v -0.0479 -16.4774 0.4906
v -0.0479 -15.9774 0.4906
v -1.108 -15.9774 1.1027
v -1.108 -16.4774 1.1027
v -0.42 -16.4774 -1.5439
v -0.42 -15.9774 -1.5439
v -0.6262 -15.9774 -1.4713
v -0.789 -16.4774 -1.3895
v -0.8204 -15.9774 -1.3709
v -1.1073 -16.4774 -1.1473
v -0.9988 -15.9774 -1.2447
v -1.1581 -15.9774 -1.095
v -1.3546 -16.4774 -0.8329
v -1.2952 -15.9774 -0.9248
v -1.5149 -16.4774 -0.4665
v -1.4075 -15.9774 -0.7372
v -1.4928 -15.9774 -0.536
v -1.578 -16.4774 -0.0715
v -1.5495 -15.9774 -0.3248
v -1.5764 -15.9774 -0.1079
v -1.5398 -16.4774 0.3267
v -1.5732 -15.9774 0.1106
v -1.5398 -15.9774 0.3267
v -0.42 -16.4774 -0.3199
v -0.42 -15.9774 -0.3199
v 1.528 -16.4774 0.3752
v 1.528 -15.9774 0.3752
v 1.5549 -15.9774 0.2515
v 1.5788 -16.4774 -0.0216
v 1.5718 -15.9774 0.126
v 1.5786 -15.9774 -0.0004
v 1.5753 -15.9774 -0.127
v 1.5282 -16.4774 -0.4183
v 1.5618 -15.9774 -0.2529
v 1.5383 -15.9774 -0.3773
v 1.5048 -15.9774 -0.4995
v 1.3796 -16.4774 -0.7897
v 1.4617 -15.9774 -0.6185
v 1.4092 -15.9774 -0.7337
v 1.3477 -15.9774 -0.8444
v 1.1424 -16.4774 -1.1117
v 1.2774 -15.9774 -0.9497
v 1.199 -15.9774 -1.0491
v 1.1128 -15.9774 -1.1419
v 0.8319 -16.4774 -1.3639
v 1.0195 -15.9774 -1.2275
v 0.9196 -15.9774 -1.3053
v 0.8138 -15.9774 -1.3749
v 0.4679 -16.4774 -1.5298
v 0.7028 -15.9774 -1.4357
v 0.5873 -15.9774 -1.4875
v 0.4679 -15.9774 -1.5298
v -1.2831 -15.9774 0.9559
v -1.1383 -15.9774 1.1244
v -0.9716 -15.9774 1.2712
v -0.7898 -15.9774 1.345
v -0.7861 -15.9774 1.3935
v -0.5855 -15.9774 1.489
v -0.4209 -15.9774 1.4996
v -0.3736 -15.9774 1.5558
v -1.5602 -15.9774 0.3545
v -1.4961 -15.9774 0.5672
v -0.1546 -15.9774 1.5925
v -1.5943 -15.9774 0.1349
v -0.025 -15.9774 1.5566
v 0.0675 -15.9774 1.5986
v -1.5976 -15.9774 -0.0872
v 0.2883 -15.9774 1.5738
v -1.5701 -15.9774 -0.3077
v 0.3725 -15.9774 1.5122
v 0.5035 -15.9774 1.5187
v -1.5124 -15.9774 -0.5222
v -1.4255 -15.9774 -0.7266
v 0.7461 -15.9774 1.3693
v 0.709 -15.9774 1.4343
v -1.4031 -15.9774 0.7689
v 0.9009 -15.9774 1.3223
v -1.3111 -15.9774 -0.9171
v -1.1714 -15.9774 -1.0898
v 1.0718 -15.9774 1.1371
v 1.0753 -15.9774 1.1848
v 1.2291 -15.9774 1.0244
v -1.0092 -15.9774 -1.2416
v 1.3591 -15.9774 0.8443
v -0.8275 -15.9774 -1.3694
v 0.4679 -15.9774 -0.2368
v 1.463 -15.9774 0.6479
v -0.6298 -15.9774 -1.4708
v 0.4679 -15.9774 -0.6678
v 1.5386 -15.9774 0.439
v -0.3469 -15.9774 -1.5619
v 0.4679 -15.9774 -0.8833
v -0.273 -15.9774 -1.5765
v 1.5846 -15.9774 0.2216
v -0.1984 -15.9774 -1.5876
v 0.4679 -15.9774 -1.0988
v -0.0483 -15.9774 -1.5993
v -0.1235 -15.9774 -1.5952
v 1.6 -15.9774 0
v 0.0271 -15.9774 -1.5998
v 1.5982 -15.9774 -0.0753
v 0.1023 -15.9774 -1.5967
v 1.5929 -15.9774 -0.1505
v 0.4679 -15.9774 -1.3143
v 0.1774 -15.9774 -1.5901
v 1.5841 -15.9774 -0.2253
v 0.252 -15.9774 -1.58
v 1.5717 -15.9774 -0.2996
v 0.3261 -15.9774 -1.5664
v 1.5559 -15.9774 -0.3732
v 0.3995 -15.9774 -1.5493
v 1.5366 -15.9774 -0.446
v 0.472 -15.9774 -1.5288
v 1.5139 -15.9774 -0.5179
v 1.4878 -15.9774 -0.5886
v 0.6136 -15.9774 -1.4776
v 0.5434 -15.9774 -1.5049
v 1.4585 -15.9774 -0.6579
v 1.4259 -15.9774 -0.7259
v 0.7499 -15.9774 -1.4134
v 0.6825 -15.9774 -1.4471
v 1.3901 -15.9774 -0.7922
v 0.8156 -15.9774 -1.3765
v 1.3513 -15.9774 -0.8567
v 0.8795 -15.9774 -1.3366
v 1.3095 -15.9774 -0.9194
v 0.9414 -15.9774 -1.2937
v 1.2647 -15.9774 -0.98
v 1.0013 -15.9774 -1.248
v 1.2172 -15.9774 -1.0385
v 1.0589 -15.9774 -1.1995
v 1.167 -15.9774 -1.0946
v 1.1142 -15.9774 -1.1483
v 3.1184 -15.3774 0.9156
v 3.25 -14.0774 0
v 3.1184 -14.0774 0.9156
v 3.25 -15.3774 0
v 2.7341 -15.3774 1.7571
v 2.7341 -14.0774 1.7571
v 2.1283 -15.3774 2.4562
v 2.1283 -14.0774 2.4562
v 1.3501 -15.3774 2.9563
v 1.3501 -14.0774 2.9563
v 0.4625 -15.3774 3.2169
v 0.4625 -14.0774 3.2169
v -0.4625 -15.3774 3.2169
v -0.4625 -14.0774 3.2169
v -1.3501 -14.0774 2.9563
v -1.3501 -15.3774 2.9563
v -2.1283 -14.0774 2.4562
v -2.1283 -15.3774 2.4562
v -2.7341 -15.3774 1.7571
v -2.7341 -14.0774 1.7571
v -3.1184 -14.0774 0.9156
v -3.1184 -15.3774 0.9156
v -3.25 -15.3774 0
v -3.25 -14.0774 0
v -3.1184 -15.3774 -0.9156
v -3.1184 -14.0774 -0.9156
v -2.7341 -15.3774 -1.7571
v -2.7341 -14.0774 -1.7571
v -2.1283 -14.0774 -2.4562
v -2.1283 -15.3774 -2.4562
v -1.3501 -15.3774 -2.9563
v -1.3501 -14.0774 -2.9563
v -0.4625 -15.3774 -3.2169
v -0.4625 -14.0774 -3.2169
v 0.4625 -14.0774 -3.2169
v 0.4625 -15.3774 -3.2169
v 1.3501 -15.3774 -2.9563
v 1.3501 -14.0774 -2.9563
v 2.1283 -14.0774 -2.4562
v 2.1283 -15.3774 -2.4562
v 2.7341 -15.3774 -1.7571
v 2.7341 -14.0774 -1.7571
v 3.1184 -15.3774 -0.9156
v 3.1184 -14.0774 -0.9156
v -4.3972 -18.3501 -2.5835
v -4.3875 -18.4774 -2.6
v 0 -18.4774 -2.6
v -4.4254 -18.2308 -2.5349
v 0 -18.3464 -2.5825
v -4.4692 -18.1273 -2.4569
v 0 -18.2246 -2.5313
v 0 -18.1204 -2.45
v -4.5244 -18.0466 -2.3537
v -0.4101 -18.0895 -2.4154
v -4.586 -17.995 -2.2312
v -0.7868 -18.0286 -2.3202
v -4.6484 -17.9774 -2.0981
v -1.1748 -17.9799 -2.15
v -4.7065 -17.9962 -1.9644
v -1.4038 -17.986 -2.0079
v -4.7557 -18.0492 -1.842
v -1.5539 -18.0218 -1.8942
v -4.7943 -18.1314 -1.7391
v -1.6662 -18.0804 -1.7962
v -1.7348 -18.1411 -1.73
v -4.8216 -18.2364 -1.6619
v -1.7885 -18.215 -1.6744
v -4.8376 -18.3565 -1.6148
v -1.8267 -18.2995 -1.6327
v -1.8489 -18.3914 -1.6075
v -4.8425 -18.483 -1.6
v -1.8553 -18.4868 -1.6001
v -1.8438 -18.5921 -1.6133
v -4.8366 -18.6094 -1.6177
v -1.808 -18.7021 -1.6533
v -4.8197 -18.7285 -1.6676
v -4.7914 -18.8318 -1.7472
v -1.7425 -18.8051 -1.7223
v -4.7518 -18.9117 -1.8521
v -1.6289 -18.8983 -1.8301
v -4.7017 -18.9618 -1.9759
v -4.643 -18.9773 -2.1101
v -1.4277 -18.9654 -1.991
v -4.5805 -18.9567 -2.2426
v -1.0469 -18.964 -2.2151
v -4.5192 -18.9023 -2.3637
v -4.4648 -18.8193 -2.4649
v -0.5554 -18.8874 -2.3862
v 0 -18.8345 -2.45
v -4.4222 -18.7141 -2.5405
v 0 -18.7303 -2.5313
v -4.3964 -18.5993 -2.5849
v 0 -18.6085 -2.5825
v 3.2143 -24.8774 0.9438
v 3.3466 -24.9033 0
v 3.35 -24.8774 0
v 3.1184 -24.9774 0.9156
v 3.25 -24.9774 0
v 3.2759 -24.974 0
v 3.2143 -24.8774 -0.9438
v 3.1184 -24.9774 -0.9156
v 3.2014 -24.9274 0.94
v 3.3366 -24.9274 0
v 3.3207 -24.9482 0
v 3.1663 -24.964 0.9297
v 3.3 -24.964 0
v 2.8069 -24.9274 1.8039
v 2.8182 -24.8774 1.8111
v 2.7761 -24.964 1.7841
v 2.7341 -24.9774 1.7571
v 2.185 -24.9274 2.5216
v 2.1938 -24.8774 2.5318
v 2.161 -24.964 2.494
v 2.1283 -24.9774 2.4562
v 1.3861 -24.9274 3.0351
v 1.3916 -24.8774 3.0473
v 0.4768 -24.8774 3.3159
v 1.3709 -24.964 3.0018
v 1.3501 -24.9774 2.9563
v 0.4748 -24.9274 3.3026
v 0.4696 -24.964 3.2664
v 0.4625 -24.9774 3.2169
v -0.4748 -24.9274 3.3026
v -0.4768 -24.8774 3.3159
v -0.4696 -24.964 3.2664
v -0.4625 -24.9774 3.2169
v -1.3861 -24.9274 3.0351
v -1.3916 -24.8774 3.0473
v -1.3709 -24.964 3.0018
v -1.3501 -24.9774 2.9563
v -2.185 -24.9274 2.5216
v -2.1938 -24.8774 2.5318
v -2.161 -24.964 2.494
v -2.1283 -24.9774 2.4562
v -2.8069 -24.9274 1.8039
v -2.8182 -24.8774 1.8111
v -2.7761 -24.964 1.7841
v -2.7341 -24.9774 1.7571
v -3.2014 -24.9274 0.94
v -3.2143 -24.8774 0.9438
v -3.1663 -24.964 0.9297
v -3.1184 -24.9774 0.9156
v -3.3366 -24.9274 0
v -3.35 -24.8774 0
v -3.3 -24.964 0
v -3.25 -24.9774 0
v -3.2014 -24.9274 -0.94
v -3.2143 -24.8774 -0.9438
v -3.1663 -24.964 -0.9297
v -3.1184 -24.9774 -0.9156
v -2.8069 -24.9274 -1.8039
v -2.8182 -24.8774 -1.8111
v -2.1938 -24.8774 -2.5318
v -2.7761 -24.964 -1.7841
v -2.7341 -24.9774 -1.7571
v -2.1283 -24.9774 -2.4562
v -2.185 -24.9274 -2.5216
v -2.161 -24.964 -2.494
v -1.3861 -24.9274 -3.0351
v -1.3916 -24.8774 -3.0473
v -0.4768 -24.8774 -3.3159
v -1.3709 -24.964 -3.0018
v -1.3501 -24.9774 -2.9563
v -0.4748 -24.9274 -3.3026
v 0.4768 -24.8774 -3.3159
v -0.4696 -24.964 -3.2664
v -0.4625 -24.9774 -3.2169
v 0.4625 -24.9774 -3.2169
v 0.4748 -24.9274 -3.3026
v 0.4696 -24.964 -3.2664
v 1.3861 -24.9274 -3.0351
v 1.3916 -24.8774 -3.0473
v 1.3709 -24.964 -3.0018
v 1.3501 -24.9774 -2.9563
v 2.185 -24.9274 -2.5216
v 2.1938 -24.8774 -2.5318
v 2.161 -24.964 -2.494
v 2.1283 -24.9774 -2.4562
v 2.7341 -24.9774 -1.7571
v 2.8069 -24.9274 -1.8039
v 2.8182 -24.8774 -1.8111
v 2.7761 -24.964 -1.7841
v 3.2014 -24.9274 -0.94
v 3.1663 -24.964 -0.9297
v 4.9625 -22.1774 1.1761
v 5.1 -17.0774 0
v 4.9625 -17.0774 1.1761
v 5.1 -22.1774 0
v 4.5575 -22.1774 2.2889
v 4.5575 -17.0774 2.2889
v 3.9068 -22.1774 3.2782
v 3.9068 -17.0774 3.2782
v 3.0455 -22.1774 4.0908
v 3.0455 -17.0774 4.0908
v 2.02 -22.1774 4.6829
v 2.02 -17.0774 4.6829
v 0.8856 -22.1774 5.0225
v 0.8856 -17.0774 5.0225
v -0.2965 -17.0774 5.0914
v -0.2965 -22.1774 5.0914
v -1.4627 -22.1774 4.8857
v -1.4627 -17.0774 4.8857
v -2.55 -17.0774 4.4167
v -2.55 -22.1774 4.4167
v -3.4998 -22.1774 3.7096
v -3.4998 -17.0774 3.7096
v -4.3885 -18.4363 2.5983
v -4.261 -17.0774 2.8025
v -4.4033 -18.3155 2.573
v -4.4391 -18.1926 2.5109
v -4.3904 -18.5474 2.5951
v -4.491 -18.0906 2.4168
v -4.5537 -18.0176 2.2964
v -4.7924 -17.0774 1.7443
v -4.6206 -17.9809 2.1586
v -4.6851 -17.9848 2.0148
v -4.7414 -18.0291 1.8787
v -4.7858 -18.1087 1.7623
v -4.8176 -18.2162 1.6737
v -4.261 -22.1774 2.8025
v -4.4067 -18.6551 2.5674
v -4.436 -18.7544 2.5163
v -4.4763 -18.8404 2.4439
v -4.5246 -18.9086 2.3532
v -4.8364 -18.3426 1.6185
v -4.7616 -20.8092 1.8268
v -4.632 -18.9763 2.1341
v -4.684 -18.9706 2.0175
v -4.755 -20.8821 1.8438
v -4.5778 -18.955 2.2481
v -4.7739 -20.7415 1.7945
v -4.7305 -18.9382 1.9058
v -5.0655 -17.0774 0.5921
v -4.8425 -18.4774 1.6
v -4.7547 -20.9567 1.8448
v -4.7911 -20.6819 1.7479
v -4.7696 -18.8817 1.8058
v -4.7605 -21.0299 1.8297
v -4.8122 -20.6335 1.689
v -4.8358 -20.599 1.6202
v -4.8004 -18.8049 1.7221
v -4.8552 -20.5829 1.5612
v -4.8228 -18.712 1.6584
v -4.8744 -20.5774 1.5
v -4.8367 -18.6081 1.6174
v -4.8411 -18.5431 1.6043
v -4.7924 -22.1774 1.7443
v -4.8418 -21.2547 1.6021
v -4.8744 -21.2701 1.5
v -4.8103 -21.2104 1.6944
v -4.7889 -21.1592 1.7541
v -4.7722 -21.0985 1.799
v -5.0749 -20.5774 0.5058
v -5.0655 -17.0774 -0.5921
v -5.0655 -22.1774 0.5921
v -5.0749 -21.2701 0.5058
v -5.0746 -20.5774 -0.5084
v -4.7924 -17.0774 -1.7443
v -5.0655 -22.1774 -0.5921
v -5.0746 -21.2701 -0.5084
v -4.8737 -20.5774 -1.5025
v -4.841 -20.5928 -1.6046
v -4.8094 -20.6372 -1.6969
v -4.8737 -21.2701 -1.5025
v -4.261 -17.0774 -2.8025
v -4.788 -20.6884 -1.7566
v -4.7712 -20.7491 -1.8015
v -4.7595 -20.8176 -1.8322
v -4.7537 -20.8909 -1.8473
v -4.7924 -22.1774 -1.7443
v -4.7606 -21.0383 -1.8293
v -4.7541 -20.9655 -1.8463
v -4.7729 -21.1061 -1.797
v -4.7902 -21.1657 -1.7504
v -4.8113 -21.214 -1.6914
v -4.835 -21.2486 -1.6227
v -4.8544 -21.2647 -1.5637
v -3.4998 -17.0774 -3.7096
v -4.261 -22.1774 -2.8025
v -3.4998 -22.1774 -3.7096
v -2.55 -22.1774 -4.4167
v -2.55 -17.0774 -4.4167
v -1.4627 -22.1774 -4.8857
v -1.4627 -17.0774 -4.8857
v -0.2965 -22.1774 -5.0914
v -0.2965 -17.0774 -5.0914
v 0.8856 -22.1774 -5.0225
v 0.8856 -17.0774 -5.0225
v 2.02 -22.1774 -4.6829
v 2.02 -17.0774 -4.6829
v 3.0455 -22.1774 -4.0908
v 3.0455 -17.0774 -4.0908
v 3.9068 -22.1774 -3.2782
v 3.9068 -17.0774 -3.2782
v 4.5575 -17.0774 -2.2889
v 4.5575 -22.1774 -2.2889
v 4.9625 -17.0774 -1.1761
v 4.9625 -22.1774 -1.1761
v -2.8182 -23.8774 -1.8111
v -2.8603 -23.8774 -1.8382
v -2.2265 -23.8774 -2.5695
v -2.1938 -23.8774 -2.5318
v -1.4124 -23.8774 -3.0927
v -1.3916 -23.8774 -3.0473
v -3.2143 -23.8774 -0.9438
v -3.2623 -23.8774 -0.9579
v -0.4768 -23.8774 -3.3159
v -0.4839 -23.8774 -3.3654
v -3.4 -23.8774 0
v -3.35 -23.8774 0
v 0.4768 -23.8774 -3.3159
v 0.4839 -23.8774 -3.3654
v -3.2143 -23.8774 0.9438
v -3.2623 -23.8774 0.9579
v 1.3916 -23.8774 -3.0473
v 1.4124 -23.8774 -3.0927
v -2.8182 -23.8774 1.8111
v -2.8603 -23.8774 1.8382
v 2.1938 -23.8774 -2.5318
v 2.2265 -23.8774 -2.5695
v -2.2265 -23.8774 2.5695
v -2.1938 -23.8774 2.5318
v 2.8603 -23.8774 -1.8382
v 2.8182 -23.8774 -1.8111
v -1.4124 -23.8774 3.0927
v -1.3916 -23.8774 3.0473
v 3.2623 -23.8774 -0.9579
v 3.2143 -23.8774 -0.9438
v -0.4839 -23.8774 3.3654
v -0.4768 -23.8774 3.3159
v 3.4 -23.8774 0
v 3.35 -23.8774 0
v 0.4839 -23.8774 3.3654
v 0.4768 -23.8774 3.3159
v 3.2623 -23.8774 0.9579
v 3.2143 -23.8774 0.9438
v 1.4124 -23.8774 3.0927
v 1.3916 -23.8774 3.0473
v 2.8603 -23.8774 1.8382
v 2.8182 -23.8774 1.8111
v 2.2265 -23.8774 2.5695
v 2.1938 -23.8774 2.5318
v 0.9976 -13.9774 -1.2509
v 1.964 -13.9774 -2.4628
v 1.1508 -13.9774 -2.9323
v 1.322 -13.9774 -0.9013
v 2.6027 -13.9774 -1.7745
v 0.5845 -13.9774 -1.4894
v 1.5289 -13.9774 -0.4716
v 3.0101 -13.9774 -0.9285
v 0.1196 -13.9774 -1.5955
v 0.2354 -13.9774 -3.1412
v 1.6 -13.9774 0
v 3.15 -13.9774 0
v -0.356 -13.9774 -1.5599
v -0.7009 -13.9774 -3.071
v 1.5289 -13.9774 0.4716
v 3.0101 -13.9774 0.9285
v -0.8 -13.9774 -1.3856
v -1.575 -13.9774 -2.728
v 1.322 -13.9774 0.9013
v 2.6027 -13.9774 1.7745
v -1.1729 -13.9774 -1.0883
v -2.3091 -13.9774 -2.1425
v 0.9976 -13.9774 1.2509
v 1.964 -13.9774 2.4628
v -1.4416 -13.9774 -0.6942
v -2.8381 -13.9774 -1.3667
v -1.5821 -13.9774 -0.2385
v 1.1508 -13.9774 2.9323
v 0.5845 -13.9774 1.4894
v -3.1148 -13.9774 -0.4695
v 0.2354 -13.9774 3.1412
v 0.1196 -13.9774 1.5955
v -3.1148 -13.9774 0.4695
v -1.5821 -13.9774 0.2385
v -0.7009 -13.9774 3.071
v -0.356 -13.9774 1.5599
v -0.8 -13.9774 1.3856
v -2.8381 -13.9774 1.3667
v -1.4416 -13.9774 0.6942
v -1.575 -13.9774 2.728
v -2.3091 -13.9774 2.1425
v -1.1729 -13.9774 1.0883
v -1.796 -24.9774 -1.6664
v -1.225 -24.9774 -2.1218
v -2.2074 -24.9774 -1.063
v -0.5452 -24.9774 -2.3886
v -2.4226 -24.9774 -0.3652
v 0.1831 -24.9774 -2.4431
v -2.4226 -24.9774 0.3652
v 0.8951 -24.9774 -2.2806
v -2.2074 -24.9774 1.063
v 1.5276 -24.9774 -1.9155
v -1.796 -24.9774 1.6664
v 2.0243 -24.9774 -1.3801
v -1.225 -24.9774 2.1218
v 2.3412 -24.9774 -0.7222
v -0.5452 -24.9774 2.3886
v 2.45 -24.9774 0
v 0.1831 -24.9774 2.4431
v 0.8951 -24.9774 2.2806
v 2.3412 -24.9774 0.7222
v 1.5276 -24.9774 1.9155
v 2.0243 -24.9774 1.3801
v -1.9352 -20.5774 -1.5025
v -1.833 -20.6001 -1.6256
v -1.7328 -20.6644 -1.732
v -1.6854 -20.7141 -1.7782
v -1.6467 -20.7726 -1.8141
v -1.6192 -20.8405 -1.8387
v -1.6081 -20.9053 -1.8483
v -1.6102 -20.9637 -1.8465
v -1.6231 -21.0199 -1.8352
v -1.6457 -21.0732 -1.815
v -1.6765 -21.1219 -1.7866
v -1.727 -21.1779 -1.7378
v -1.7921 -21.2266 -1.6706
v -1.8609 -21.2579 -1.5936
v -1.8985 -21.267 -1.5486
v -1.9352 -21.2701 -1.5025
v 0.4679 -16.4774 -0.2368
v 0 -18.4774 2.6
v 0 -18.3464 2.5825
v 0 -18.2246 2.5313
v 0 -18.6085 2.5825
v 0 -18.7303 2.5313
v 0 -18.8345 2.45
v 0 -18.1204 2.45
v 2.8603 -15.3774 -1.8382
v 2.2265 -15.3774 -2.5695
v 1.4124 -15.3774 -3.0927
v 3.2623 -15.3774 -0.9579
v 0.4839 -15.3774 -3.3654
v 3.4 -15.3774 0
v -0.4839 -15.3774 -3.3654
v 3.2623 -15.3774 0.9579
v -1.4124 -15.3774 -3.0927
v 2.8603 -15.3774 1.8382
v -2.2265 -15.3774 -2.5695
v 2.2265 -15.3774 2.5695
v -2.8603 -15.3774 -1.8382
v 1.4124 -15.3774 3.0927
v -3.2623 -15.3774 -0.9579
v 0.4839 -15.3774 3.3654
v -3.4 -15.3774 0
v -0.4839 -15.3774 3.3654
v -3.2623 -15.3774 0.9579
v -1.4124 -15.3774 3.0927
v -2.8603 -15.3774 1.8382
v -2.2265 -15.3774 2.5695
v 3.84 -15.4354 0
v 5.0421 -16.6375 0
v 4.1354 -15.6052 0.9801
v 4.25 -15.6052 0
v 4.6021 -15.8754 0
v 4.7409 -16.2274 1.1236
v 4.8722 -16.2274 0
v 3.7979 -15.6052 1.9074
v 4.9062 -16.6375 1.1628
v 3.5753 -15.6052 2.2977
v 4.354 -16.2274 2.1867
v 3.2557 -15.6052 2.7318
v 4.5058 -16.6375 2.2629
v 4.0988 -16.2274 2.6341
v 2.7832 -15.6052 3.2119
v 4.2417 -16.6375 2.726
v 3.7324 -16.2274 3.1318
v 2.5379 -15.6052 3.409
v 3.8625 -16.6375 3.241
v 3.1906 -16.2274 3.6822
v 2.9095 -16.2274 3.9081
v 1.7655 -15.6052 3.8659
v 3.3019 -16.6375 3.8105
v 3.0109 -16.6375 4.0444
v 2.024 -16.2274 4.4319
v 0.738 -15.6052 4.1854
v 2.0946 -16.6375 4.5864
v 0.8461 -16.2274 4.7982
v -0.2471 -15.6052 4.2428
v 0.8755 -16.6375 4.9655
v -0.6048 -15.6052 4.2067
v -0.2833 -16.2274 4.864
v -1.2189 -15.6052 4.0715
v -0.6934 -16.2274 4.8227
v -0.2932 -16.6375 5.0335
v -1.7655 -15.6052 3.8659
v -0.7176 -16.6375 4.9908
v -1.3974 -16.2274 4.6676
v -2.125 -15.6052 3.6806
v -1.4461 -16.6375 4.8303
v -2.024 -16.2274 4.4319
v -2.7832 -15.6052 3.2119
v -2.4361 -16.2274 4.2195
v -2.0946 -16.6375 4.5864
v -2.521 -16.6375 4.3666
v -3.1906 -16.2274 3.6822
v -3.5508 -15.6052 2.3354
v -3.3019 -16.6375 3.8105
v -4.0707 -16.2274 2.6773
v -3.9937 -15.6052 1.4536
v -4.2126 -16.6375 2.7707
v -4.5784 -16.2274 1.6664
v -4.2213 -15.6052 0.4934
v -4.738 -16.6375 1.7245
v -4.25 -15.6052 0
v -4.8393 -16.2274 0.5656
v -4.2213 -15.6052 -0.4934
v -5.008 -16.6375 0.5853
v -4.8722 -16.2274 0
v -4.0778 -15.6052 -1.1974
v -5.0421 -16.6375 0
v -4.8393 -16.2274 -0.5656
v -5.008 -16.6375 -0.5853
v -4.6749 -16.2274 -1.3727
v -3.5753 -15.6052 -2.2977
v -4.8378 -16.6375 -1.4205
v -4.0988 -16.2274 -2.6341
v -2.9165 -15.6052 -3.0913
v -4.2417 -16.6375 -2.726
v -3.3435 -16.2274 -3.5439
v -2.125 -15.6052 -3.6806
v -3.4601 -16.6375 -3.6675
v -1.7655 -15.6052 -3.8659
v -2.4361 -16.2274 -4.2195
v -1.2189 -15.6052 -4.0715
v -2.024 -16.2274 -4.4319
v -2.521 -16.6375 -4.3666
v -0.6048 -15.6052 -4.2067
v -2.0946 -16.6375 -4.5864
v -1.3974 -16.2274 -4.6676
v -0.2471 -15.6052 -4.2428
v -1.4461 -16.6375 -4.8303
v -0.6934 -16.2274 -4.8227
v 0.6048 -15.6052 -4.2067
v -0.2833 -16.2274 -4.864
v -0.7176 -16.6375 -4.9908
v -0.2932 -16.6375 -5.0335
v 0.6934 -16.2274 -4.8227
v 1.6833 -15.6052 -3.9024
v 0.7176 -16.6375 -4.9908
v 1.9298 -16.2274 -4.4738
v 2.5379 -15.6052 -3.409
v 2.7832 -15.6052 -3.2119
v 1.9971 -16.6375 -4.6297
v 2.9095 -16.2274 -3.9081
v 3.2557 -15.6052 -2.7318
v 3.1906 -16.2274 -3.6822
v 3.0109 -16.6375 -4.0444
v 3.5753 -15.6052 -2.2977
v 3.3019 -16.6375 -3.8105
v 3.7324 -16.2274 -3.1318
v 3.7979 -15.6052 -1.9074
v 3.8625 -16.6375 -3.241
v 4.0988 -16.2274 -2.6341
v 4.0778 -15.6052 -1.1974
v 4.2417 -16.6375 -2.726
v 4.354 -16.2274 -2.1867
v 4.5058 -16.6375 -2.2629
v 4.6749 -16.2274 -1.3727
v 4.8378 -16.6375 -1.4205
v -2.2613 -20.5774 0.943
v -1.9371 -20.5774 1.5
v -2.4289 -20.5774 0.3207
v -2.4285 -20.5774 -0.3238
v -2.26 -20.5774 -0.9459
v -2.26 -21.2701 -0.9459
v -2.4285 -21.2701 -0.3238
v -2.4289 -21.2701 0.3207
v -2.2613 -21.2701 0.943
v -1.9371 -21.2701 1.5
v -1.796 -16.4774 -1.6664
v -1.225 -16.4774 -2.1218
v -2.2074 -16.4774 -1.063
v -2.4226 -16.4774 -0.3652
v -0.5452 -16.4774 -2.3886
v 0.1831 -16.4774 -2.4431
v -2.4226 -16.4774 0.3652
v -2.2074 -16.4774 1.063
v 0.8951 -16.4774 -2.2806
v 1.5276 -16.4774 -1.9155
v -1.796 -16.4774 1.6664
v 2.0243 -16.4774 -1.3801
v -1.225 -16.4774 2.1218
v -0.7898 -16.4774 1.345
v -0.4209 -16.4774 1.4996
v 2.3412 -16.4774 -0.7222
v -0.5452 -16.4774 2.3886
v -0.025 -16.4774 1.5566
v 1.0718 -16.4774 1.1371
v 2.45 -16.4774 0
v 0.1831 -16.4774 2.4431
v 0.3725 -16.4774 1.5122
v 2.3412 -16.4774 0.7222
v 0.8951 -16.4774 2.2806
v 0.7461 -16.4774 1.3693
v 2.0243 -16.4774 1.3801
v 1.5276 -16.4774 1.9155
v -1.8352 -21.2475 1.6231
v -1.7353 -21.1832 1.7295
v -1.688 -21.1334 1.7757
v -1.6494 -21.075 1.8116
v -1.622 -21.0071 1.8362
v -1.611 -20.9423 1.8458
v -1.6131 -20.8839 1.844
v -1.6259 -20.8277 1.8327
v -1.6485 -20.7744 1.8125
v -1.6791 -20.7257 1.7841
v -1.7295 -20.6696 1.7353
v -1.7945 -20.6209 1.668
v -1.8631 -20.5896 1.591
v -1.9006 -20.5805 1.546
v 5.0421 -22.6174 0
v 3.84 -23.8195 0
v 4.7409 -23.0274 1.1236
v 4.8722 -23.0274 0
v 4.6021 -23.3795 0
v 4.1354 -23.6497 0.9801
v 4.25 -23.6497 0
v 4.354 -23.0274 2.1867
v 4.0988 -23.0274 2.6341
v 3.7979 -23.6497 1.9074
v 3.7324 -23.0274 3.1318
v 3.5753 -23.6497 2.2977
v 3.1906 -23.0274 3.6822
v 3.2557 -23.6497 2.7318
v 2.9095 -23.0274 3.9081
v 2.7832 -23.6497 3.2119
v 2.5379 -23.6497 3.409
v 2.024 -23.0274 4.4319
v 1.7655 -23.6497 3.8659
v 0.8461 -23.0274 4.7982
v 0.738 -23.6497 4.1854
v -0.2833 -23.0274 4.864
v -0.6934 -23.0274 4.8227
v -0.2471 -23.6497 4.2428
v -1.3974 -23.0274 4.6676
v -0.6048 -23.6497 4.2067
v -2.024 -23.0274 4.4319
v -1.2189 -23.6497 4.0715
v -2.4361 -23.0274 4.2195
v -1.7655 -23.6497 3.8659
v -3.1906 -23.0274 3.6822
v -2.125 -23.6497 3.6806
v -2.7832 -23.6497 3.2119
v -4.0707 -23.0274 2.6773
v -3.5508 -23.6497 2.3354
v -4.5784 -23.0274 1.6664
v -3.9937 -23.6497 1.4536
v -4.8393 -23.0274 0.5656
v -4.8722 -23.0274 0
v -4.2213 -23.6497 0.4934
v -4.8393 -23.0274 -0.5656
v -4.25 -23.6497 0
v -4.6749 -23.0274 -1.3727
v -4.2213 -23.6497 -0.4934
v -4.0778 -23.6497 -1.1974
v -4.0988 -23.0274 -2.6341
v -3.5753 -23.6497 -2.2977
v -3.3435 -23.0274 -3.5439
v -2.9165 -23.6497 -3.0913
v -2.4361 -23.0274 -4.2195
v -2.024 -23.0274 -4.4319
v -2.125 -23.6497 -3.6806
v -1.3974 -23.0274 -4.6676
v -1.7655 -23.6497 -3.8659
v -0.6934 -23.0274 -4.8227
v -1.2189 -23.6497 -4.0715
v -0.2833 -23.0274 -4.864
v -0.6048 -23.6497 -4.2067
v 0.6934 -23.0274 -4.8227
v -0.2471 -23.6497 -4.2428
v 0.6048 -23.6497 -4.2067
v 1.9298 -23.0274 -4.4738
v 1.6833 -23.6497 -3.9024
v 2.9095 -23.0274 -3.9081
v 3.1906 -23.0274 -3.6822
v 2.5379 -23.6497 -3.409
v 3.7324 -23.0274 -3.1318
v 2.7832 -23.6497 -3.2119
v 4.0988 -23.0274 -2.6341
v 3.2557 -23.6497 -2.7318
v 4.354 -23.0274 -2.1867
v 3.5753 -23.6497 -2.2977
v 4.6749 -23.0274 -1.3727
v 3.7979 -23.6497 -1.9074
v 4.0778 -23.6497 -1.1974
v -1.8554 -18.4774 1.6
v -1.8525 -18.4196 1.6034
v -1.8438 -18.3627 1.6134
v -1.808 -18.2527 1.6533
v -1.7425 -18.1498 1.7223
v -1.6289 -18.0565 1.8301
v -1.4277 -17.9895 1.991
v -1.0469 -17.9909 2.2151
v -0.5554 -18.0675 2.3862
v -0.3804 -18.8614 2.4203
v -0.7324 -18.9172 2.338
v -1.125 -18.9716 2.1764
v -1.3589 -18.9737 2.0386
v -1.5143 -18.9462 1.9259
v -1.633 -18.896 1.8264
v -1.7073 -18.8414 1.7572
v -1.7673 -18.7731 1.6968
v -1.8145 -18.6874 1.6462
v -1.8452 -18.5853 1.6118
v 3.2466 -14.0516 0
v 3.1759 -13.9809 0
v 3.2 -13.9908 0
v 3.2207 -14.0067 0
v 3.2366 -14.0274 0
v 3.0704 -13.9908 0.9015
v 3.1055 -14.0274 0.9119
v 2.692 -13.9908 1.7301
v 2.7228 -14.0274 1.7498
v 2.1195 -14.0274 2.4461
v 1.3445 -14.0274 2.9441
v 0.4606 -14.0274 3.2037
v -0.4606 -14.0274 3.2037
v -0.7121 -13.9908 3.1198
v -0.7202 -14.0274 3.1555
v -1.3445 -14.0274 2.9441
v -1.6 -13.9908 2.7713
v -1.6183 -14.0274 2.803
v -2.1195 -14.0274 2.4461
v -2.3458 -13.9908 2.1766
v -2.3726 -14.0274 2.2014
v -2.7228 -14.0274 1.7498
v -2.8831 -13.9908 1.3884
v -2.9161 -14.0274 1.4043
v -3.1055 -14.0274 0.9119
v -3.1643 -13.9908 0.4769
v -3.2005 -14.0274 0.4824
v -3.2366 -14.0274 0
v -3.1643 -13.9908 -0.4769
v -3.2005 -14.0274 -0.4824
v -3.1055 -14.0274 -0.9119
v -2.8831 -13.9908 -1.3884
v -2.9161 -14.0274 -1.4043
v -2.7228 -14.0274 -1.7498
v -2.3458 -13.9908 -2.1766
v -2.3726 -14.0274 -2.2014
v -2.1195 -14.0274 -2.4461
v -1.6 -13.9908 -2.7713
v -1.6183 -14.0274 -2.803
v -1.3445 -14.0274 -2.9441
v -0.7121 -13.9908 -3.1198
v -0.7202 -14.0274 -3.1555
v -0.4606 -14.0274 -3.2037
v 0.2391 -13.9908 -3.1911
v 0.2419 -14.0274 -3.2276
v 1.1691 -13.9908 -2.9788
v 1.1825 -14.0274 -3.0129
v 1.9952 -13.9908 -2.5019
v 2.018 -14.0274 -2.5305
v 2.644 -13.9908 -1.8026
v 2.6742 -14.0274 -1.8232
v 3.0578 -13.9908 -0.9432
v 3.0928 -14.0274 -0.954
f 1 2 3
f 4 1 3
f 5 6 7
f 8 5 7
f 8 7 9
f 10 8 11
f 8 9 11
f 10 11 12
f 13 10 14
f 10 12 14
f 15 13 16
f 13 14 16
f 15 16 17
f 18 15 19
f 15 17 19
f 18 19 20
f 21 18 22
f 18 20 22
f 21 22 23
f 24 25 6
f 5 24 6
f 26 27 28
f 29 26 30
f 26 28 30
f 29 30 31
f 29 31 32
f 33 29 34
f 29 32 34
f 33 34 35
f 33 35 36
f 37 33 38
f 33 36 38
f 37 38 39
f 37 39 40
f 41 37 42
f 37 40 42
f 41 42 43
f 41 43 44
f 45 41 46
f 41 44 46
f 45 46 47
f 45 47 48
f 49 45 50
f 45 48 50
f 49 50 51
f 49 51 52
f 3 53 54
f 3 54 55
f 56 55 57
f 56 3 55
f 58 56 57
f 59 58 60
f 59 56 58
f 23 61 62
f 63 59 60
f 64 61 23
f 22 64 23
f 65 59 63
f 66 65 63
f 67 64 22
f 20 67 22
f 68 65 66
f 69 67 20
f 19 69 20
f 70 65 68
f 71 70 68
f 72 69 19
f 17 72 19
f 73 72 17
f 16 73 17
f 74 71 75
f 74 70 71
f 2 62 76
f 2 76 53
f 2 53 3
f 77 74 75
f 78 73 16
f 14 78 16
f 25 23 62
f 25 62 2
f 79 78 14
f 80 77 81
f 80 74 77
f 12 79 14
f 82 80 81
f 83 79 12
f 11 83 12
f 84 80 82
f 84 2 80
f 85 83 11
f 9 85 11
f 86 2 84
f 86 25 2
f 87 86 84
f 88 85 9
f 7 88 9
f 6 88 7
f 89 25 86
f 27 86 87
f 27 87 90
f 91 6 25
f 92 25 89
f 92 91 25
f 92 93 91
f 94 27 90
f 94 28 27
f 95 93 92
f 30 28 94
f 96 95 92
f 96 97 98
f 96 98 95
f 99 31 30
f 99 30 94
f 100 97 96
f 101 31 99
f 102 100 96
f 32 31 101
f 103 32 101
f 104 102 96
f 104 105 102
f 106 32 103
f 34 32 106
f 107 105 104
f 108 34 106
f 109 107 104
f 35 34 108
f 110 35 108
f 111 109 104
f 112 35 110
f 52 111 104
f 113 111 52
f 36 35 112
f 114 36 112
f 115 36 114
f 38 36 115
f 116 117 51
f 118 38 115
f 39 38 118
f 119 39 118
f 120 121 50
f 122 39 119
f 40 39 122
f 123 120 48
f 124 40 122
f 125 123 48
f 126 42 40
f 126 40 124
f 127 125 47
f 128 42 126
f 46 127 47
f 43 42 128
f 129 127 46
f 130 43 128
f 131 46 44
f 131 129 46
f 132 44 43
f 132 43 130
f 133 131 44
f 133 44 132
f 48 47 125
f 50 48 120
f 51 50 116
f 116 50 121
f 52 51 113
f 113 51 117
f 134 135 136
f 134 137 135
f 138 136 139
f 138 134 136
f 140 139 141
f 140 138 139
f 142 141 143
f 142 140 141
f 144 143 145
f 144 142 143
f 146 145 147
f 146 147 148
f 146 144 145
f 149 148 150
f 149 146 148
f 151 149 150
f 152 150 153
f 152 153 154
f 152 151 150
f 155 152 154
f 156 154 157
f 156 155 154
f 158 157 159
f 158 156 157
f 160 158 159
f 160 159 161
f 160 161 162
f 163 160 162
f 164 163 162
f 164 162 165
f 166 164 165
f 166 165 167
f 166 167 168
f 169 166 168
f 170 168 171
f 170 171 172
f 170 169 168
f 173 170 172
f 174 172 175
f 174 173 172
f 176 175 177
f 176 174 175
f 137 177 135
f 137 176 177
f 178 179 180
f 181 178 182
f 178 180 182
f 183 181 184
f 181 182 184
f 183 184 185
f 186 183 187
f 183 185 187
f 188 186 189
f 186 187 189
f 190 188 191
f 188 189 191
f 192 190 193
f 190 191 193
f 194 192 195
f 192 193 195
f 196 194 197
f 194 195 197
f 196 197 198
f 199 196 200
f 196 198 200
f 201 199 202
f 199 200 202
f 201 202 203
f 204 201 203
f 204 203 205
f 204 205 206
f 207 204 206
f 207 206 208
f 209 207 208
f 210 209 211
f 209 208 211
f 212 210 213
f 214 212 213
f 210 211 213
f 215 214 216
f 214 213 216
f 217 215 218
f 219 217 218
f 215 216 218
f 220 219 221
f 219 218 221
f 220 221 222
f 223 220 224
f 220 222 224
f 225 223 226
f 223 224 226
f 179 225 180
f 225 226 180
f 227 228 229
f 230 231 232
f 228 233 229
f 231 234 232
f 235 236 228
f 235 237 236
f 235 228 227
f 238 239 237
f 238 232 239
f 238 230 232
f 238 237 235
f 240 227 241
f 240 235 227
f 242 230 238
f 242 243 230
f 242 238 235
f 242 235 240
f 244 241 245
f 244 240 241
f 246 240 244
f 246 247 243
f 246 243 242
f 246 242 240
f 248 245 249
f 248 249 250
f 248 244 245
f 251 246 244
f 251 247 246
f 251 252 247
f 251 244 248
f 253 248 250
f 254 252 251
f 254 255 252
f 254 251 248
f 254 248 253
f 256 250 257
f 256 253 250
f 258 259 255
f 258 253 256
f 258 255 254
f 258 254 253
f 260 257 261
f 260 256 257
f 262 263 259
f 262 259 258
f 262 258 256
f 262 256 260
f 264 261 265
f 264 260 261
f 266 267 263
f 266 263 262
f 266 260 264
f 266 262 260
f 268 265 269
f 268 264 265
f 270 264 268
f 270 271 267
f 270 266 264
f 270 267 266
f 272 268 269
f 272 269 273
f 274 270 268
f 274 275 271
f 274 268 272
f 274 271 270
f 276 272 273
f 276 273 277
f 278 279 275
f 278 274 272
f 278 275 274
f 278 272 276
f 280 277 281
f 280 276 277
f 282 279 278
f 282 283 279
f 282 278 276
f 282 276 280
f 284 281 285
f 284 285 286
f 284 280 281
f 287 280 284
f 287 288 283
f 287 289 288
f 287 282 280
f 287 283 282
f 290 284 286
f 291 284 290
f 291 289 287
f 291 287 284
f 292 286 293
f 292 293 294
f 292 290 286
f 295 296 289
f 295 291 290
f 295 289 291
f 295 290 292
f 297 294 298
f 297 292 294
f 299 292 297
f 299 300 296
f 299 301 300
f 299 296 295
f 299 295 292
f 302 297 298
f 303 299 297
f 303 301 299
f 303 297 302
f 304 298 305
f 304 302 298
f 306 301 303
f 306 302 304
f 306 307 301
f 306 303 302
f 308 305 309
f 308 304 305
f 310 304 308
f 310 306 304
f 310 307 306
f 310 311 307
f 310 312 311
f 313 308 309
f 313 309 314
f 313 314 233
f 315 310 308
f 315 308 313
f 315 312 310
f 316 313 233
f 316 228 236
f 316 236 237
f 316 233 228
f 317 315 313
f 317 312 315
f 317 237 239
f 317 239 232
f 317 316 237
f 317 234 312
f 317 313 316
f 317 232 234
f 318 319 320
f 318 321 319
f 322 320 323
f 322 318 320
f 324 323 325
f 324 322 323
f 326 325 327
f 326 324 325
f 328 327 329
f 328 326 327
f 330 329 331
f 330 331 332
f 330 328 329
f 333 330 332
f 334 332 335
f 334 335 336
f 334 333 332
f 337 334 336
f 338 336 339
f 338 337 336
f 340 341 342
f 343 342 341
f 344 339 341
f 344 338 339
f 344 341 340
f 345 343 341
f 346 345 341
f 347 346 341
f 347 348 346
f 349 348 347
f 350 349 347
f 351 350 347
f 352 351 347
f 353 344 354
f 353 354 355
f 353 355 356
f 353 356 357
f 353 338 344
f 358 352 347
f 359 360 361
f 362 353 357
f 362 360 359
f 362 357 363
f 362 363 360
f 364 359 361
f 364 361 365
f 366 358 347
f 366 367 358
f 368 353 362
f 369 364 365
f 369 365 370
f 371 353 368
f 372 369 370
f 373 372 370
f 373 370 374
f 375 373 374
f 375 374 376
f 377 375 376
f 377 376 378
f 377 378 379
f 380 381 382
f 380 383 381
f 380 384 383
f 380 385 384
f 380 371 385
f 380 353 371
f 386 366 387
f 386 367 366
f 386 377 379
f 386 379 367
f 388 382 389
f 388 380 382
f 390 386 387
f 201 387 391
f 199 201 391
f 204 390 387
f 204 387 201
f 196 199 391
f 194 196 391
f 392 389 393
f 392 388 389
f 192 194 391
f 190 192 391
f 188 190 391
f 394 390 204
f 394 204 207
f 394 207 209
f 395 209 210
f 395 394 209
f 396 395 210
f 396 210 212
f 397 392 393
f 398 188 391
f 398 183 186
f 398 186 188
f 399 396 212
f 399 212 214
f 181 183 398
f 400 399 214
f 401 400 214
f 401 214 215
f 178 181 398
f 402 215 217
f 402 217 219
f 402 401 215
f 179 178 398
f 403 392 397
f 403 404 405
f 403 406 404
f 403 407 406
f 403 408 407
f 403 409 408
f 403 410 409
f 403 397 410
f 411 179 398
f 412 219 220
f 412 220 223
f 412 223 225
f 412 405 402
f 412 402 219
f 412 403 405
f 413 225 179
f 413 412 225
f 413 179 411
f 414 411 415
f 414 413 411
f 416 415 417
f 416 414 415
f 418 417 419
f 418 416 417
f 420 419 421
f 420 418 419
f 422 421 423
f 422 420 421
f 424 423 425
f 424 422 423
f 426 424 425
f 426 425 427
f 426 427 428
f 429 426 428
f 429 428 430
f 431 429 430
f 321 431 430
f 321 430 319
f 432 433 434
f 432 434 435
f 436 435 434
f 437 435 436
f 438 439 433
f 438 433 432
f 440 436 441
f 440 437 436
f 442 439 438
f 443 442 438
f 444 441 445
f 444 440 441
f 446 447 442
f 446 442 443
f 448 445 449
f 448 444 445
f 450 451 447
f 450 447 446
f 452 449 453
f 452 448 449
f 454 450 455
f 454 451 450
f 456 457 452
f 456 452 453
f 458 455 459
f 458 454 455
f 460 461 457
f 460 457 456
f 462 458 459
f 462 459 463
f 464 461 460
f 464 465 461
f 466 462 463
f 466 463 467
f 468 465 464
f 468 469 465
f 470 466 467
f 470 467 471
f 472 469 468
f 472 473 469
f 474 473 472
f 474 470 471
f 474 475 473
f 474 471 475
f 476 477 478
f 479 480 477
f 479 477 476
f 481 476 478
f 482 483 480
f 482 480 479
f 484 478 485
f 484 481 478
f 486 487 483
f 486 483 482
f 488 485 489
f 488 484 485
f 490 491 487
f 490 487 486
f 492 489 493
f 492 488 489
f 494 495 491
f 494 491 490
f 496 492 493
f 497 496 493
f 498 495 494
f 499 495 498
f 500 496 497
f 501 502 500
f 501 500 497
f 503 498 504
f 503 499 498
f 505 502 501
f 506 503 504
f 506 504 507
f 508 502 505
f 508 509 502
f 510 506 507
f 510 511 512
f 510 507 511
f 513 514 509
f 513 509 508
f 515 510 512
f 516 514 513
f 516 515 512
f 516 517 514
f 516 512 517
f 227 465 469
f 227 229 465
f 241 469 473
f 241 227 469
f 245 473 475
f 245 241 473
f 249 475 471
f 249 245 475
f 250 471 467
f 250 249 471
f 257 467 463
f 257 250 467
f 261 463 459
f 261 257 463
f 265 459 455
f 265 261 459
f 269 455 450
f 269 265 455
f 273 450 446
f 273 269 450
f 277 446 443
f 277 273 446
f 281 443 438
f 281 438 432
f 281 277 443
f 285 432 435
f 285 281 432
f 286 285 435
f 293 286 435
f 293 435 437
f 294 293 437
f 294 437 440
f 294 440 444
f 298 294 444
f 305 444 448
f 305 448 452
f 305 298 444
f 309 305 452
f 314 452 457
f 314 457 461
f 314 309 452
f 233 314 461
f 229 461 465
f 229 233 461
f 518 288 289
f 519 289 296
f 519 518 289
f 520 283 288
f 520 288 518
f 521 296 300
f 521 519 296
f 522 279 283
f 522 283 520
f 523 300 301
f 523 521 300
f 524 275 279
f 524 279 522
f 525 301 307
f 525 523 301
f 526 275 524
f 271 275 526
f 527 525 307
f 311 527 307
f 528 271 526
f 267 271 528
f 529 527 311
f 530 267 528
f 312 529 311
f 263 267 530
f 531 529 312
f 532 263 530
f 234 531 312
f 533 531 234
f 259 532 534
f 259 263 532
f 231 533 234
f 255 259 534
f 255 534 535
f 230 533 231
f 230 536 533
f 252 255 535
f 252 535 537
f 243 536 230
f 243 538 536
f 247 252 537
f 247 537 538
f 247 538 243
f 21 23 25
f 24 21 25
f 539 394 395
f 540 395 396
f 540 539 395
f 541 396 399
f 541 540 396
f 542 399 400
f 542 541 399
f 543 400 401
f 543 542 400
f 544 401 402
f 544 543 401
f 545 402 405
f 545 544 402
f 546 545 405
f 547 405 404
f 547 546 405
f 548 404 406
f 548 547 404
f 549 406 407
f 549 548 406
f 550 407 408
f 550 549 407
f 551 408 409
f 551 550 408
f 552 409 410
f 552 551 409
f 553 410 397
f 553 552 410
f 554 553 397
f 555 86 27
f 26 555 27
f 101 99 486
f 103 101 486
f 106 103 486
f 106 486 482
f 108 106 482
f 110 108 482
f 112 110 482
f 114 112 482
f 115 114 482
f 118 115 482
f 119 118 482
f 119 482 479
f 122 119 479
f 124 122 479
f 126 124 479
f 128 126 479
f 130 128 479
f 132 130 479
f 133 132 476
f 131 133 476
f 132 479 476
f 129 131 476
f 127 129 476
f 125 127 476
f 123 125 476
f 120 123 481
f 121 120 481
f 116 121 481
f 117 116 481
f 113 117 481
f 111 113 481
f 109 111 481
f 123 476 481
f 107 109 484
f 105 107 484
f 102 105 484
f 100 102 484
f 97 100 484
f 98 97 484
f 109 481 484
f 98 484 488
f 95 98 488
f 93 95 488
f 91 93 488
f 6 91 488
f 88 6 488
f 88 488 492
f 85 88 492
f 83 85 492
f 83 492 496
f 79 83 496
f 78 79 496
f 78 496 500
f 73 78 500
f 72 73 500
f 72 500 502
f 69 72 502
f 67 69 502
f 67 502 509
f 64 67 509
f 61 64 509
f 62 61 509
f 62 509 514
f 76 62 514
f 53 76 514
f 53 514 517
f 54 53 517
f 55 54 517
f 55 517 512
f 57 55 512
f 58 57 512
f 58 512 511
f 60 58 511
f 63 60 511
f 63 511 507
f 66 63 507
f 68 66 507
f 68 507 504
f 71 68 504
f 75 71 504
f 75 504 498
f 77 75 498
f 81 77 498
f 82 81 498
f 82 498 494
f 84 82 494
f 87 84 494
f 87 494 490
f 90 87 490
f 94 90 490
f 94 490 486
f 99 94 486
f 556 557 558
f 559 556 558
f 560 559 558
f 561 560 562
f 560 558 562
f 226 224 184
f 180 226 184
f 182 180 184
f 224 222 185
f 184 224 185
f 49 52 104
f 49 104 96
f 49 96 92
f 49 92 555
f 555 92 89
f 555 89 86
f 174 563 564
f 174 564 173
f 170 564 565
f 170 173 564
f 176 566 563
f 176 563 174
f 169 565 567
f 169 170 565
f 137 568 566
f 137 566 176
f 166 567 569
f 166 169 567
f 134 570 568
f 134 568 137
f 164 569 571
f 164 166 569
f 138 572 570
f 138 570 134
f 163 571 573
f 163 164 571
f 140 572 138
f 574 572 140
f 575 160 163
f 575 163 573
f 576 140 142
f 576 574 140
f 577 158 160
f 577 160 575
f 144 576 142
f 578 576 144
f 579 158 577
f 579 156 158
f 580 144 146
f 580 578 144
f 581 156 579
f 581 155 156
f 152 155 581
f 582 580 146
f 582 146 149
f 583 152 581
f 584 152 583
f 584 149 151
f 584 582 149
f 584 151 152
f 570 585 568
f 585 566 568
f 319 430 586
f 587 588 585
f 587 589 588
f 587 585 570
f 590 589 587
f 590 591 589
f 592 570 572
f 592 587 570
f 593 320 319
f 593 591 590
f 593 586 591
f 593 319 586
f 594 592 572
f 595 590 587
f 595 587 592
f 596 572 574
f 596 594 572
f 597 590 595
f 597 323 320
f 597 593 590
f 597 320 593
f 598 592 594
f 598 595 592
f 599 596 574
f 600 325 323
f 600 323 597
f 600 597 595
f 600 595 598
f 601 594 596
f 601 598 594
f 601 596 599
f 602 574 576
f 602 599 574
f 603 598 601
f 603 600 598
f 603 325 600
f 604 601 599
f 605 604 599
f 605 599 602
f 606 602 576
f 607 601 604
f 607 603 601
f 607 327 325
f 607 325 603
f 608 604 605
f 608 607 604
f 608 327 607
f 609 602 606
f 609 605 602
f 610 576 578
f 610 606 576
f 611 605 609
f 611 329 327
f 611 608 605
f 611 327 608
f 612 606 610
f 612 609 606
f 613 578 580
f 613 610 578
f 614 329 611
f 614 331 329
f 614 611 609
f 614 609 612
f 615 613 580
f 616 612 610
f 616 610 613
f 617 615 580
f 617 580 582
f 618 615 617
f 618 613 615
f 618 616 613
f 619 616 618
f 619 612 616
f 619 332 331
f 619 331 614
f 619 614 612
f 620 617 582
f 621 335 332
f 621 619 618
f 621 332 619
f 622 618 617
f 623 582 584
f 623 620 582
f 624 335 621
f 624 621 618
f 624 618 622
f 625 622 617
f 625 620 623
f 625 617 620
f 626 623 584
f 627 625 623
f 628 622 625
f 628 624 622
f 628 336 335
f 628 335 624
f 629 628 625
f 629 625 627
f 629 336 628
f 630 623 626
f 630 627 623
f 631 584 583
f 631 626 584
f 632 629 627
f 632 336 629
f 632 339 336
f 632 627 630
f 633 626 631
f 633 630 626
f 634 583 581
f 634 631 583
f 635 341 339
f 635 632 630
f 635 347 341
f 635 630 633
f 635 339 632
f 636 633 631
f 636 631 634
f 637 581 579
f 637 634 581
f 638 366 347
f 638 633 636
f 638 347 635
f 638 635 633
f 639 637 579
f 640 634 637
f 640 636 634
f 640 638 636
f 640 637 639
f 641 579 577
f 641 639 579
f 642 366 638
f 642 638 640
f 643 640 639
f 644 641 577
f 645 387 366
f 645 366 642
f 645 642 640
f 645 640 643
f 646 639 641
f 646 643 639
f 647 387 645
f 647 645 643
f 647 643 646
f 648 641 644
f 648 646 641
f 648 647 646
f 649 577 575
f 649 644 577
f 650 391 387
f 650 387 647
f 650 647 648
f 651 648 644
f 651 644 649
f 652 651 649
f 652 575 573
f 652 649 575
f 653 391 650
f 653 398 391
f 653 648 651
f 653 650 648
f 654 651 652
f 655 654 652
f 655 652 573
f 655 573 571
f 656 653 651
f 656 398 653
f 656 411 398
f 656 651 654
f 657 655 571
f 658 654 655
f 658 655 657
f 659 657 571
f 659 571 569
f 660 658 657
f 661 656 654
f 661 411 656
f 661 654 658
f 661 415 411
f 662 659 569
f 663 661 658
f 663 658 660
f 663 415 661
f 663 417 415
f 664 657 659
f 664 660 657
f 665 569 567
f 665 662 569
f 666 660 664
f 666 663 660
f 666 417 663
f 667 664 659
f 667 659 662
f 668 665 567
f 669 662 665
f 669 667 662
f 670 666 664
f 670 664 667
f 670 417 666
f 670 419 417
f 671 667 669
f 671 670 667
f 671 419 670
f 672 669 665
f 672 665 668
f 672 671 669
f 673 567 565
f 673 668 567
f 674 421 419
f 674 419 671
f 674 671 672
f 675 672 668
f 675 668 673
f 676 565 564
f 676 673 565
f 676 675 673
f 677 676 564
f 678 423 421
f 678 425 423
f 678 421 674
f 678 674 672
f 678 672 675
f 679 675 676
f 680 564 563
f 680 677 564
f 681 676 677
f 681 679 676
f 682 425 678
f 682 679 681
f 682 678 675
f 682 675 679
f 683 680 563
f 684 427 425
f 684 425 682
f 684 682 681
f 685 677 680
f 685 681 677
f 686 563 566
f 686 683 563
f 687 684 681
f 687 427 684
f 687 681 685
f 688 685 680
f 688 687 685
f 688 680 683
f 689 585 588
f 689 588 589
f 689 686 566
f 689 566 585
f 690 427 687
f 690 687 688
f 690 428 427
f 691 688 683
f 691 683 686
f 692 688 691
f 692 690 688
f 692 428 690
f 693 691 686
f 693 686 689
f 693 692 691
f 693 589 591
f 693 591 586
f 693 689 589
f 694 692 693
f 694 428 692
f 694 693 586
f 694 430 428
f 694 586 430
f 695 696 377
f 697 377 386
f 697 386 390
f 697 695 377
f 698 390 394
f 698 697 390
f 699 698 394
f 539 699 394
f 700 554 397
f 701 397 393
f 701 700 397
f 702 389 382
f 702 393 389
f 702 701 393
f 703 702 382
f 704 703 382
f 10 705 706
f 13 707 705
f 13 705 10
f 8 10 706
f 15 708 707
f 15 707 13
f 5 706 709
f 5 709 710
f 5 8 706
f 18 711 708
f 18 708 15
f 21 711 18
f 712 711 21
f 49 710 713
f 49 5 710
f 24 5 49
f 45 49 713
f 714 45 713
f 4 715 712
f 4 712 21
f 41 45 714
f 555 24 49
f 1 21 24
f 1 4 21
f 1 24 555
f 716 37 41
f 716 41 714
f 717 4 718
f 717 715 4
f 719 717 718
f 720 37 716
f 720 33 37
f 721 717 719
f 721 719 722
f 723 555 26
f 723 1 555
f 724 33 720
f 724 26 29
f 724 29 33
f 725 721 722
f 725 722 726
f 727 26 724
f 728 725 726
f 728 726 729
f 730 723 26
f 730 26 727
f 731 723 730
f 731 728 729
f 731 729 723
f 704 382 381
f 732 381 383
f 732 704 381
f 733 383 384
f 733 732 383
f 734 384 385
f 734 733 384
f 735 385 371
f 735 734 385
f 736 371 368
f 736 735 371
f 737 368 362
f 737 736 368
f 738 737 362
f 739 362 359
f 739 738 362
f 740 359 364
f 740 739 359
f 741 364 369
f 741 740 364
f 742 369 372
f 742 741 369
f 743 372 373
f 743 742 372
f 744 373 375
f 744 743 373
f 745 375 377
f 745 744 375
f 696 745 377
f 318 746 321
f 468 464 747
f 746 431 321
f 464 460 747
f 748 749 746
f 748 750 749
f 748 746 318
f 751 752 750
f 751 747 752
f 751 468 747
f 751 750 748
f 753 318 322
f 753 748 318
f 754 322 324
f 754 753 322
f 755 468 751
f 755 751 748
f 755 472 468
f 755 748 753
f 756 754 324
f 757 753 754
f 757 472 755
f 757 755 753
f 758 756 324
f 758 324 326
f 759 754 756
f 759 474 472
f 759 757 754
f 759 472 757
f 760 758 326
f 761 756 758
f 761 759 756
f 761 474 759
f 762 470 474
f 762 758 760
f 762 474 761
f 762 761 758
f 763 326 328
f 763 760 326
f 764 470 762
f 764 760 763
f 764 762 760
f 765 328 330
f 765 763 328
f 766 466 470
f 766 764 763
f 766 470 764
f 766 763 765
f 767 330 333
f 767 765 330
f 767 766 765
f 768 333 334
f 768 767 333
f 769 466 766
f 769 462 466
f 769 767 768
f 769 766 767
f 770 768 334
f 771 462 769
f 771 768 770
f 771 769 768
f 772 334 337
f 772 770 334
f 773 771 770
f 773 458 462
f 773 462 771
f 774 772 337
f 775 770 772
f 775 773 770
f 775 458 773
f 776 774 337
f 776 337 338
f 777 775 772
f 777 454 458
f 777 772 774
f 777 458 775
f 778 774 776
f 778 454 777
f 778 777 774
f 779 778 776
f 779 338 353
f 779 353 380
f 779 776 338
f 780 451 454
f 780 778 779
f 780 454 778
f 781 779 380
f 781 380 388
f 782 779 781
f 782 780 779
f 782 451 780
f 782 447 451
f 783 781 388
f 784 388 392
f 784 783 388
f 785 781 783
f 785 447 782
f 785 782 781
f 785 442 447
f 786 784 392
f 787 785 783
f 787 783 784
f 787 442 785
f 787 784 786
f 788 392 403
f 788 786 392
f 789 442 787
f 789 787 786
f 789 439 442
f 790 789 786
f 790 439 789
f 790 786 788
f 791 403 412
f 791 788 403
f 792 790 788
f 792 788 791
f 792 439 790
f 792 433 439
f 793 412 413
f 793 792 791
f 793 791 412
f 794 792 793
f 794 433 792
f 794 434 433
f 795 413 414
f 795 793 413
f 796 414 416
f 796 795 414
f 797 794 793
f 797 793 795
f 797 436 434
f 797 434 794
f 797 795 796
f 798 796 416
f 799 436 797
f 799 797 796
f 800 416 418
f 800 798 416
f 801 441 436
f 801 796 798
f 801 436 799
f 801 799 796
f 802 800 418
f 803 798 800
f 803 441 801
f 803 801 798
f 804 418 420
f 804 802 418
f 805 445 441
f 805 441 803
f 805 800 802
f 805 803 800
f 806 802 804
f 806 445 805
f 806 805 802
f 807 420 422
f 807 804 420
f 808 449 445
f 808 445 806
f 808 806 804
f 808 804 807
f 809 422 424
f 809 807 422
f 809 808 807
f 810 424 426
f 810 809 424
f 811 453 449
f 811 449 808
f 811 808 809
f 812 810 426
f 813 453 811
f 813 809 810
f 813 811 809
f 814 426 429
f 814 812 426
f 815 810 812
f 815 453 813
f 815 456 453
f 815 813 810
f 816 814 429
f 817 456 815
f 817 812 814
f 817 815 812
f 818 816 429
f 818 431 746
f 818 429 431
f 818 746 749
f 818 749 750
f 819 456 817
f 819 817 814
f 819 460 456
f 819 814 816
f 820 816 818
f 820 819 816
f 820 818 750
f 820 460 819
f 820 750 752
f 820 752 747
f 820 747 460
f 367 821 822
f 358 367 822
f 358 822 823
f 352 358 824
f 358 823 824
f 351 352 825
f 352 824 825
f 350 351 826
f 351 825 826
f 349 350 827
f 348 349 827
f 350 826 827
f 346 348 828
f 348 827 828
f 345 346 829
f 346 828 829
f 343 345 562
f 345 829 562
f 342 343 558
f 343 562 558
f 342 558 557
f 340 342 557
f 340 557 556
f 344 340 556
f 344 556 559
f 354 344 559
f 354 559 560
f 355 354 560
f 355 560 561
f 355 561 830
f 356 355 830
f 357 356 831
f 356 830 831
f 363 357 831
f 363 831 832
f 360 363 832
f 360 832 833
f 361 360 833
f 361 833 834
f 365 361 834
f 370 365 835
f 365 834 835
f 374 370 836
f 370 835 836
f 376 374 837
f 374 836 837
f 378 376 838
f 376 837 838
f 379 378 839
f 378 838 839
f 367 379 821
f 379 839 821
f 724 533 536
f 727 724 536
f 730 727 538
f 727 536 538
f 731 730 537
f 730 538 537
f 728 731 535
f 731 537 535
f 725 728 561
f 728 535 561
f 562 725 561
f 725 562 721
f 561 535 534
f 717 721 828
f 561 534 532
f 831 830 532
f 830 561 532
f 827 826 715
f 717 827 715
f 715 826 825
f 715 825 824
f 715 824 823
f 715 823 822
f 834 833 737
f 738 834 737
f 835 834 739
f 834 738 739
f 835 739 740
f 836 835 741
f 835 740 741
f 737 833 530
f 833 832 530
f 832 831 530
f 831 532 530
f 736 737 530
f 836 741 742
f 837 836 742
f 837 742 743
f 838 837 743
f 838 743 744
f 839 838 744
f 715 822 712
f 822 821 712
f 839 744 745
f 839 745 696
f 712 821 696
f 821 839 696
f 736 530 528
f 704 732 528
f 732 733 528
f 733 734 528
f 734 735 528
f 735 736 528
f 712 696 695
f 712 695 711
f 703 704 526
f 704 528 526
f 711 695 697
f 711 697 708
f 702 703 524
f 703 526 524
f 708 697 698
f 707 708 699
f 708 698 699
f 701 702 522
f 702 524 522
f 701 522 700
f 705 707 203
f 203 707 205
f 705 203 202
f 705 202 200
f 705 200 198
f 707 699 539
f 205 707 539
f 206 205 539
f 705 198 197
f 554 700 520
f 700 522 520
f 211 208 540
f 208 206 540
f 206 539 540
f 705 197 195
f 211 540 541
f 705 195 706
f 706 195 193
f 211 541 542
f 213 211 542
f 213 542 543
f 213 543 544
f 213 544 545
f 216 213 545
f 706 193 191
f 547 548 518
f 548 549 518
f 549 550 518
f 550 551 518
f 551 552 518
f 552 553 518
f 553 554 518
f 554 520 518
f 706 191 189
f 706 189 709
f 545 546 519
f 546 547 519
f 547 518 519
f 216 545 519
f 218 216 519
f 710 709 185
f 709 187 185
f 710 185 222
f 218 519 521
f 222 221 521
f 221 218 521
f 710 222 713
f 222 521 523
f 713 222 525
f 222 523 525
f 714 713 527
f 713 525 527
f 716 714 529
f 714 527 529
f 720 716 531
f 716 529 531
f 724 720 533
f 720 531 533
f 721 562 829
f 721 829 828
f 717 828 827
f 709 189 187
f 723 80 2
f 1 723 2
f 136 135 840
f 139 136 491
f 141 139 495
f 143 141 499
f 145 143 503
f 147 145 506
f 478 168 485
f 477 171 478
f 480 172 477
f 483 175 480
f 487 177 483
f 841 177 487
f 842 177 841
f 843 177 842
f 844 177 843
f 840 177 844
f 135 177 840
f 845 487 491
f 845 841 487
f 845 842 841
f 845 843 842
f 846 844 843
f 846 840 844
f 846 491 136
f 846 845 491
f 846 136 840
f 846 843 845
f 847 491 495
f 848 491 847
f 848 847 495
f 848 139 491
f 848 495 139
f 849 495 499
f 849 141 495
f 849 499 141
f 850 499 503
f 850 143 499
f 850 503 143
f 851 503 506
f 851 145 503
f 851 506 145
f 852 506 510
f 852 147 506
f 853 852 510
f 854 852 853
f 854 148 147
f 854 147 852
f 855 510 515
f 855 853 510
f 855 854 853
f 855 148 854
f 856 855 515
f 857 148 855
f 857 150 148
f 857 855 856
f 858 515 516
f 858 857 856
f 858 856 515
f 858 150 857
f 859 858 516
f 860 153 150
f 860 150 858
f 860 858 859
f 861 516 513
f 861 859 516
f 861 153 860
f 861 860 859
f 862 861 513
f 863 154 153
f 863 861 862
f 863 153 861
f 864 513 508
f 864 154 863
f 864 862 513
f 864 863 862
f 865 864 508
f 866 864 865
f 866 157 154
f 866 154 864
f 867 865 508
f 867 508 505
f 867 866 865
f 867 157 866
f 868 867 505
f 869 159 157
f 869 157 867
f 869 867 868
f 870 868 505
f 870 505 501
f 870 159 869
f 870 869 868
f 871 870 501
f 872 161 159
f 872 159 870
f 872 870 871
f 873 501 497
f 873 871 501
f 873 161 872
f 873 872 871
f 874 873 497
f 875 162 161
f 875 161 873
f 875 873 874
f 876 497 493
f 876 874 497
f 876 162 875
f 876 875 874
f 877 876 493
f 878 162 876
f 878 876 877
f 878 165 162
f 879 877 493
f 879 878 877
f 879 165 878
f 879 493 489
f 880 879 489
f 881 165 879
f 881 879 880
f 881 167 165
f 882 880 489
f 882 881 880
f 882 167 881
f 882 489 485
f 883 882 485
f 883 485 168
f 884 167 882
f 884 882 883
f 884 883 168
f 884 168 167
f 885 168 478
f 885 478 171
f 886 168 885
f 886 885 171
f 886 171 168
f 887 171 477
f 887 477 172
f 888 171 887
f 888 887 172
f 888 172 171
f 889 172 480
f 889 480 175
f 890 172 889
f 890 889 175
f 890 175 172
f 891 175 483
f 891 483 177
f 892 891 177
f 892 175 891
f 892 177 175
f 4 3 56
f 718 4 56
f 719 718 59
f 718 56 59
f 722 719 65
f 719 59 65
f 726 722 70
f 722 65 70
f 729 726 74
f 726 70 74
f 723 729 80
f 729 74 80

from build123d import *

# Parameters (mm, degrees)
SKETCH2_R          = 1.6
CUT_EXTRUDE1_DEPTH = 2
CUT_EXTRUDE3_DEPTH = 9
CIRPATTERN1_COUNT  = 3
SKETCH5_R          = 2.45
CUT_EXTRUDE4_DEPTH = 8.5
SKETCH6_R          = 0.5
CUT_EXTRUDE5_DEPTH = 8.5
CUT_EXTRUDE6_DEPTH = 8.5


with BuildPart() as part:
    # Sketch1 → Revolve1 (revolve)
    with BuildSketch(Plane.XY):
        with BuildLine():
            Line((0, -13.977445887), (3.15, -13.977445887))
            ThreePointArc((3.15, -13.977445887), (3.220710678, -14.006735209), (3.25, -14.077445887))
            Line((3.25, -14.077445887), (3.25, -15.377445887))
            Line((3.25, -15.377445887), (3.4, -15.377445887))
            ThreePointArc((3.4, -15.377445887), (4.602081528, -15.875364359), (5.1, -17.077445887))
            Line((5.1, -17.077445887), (5.1, -22.177445887))
            ThreePointArc((5.1, -22.177445887), (4.602081528, -23.379527415), (3.4, -23.877445887))
            Line((3.4, -23.877445887), (3.35, -23.877445887))
            Line((3.35, -23.877445887), (3.35, -24.877445887))
            ThreePointArc((3.35, -24.877445887), (3.320710678, -24.948156565), (3.25, -24.977445887))
            Line((3.25, -24.977445887), (0, -24.977445887))
            Line((0, -24.977445887), (0, -13.977445887))
        make_face()
    revolve(axis=Axis((0, 36.866666667, 0), (0, -1, 0)))

    # Sketch2 → Cut-Extrude1 (cut)
    with BuildSketch(Plane(origin=(0, -13.977445887, 0), x_dir=(1, 0, 0), z_dir=(0, 1, 0))):
        Circle(SKETCH2_R)
    extrude(amount=-CUT_EXTRUDE1_DEPTH, mode=Mode.SUBTRACT)

    # Sketch4 → Cut-Extrude3 (cut)
    with BuildSketch(Plane(origin=(0, -15.977445887, 0), x_dir=(1, 0, 0), z_dir=(0, 1, 0))):
        with BuildLine():
            Line((-0.42, 0.319853318), (-0.42, 1.543891188))
            ThreePointArc((-0.42, 1.543891188), (-1.354595532, 0.832929416), (-1.539787712, -0.326656419))
            Line((-1.539787712, -0.326656419), (-0.42, 0.319853318))
        make_face()
    cut_extrude3 = extrude(amount=-CUT_EXTRUDE3_DEPTH, mode=Mode.SUBTRACT)

    # CirPattern1: Cut-Extrude3 ×3 about axis
    cirpattern1_axis = Axis((0, 0, -0.022012107), (0, 1, 0))
    for i in range(1, CIRPATTERN1_COUNT):
        add(cut_extrude3.rotate(cirpattern1_axis, i * 360 / CIRPATTERN1_COUNT), mode=Mode.SUBTRACT)

    # Sketch5 → Cut-Extrude4 (cut)
    with BuildSketch(Plane.XZ.offset(24.977445887)):
        Circle(SKETCH5_R)
    extrude(amount=-CUT_EXTRUDE4_DEPTH, mode=Mode.SUBTRACT)

    # Sketch6 → Cut-Extrude5 (cut)
    with BuildSketch(Plane(origin=(0, 0, 0), x_dir=(0, 0, -1), z_dir=(1, 0, 0))):
        with Locations((-2.1, -18.477445887)):
            Circle(SKETCH6_R)
        with Locations((2.1, -18.477445887)):
            Circle(SKETCH6_R)
    extrude(amount=-CUT_EXTRUDE5_DEPTH, mode=Mode.SUBTRACT)

    # Sketch7 → Cut-Extrude6 (cut)
    with BuildSketch(Plane(origin=(0, 0, 0), x_dir=(0, 0, -1), z_dir=(1, 0, 0))):
        with BuildLine():
            Line((1.502497593, -21.270117784), (-1.5, -21.270117784))
            ThreePointArc((-1.5, -21.270117784), (-1.846335949, -20.923781835), (-1.5, -20.577445887))
            Line((-1.5, -20.577445887), (1.502497593, -20.577445887))
            ThreePointArc((1.502497593, -20.577445887), (1.848833542, -20.923781835), (1.502497593, -21.270117784))
        make_face()
    extrude(amount=-CUT_EXTRUDE6_DEPTH, mode=Mode.SUBTRACT)


solid = part.part
